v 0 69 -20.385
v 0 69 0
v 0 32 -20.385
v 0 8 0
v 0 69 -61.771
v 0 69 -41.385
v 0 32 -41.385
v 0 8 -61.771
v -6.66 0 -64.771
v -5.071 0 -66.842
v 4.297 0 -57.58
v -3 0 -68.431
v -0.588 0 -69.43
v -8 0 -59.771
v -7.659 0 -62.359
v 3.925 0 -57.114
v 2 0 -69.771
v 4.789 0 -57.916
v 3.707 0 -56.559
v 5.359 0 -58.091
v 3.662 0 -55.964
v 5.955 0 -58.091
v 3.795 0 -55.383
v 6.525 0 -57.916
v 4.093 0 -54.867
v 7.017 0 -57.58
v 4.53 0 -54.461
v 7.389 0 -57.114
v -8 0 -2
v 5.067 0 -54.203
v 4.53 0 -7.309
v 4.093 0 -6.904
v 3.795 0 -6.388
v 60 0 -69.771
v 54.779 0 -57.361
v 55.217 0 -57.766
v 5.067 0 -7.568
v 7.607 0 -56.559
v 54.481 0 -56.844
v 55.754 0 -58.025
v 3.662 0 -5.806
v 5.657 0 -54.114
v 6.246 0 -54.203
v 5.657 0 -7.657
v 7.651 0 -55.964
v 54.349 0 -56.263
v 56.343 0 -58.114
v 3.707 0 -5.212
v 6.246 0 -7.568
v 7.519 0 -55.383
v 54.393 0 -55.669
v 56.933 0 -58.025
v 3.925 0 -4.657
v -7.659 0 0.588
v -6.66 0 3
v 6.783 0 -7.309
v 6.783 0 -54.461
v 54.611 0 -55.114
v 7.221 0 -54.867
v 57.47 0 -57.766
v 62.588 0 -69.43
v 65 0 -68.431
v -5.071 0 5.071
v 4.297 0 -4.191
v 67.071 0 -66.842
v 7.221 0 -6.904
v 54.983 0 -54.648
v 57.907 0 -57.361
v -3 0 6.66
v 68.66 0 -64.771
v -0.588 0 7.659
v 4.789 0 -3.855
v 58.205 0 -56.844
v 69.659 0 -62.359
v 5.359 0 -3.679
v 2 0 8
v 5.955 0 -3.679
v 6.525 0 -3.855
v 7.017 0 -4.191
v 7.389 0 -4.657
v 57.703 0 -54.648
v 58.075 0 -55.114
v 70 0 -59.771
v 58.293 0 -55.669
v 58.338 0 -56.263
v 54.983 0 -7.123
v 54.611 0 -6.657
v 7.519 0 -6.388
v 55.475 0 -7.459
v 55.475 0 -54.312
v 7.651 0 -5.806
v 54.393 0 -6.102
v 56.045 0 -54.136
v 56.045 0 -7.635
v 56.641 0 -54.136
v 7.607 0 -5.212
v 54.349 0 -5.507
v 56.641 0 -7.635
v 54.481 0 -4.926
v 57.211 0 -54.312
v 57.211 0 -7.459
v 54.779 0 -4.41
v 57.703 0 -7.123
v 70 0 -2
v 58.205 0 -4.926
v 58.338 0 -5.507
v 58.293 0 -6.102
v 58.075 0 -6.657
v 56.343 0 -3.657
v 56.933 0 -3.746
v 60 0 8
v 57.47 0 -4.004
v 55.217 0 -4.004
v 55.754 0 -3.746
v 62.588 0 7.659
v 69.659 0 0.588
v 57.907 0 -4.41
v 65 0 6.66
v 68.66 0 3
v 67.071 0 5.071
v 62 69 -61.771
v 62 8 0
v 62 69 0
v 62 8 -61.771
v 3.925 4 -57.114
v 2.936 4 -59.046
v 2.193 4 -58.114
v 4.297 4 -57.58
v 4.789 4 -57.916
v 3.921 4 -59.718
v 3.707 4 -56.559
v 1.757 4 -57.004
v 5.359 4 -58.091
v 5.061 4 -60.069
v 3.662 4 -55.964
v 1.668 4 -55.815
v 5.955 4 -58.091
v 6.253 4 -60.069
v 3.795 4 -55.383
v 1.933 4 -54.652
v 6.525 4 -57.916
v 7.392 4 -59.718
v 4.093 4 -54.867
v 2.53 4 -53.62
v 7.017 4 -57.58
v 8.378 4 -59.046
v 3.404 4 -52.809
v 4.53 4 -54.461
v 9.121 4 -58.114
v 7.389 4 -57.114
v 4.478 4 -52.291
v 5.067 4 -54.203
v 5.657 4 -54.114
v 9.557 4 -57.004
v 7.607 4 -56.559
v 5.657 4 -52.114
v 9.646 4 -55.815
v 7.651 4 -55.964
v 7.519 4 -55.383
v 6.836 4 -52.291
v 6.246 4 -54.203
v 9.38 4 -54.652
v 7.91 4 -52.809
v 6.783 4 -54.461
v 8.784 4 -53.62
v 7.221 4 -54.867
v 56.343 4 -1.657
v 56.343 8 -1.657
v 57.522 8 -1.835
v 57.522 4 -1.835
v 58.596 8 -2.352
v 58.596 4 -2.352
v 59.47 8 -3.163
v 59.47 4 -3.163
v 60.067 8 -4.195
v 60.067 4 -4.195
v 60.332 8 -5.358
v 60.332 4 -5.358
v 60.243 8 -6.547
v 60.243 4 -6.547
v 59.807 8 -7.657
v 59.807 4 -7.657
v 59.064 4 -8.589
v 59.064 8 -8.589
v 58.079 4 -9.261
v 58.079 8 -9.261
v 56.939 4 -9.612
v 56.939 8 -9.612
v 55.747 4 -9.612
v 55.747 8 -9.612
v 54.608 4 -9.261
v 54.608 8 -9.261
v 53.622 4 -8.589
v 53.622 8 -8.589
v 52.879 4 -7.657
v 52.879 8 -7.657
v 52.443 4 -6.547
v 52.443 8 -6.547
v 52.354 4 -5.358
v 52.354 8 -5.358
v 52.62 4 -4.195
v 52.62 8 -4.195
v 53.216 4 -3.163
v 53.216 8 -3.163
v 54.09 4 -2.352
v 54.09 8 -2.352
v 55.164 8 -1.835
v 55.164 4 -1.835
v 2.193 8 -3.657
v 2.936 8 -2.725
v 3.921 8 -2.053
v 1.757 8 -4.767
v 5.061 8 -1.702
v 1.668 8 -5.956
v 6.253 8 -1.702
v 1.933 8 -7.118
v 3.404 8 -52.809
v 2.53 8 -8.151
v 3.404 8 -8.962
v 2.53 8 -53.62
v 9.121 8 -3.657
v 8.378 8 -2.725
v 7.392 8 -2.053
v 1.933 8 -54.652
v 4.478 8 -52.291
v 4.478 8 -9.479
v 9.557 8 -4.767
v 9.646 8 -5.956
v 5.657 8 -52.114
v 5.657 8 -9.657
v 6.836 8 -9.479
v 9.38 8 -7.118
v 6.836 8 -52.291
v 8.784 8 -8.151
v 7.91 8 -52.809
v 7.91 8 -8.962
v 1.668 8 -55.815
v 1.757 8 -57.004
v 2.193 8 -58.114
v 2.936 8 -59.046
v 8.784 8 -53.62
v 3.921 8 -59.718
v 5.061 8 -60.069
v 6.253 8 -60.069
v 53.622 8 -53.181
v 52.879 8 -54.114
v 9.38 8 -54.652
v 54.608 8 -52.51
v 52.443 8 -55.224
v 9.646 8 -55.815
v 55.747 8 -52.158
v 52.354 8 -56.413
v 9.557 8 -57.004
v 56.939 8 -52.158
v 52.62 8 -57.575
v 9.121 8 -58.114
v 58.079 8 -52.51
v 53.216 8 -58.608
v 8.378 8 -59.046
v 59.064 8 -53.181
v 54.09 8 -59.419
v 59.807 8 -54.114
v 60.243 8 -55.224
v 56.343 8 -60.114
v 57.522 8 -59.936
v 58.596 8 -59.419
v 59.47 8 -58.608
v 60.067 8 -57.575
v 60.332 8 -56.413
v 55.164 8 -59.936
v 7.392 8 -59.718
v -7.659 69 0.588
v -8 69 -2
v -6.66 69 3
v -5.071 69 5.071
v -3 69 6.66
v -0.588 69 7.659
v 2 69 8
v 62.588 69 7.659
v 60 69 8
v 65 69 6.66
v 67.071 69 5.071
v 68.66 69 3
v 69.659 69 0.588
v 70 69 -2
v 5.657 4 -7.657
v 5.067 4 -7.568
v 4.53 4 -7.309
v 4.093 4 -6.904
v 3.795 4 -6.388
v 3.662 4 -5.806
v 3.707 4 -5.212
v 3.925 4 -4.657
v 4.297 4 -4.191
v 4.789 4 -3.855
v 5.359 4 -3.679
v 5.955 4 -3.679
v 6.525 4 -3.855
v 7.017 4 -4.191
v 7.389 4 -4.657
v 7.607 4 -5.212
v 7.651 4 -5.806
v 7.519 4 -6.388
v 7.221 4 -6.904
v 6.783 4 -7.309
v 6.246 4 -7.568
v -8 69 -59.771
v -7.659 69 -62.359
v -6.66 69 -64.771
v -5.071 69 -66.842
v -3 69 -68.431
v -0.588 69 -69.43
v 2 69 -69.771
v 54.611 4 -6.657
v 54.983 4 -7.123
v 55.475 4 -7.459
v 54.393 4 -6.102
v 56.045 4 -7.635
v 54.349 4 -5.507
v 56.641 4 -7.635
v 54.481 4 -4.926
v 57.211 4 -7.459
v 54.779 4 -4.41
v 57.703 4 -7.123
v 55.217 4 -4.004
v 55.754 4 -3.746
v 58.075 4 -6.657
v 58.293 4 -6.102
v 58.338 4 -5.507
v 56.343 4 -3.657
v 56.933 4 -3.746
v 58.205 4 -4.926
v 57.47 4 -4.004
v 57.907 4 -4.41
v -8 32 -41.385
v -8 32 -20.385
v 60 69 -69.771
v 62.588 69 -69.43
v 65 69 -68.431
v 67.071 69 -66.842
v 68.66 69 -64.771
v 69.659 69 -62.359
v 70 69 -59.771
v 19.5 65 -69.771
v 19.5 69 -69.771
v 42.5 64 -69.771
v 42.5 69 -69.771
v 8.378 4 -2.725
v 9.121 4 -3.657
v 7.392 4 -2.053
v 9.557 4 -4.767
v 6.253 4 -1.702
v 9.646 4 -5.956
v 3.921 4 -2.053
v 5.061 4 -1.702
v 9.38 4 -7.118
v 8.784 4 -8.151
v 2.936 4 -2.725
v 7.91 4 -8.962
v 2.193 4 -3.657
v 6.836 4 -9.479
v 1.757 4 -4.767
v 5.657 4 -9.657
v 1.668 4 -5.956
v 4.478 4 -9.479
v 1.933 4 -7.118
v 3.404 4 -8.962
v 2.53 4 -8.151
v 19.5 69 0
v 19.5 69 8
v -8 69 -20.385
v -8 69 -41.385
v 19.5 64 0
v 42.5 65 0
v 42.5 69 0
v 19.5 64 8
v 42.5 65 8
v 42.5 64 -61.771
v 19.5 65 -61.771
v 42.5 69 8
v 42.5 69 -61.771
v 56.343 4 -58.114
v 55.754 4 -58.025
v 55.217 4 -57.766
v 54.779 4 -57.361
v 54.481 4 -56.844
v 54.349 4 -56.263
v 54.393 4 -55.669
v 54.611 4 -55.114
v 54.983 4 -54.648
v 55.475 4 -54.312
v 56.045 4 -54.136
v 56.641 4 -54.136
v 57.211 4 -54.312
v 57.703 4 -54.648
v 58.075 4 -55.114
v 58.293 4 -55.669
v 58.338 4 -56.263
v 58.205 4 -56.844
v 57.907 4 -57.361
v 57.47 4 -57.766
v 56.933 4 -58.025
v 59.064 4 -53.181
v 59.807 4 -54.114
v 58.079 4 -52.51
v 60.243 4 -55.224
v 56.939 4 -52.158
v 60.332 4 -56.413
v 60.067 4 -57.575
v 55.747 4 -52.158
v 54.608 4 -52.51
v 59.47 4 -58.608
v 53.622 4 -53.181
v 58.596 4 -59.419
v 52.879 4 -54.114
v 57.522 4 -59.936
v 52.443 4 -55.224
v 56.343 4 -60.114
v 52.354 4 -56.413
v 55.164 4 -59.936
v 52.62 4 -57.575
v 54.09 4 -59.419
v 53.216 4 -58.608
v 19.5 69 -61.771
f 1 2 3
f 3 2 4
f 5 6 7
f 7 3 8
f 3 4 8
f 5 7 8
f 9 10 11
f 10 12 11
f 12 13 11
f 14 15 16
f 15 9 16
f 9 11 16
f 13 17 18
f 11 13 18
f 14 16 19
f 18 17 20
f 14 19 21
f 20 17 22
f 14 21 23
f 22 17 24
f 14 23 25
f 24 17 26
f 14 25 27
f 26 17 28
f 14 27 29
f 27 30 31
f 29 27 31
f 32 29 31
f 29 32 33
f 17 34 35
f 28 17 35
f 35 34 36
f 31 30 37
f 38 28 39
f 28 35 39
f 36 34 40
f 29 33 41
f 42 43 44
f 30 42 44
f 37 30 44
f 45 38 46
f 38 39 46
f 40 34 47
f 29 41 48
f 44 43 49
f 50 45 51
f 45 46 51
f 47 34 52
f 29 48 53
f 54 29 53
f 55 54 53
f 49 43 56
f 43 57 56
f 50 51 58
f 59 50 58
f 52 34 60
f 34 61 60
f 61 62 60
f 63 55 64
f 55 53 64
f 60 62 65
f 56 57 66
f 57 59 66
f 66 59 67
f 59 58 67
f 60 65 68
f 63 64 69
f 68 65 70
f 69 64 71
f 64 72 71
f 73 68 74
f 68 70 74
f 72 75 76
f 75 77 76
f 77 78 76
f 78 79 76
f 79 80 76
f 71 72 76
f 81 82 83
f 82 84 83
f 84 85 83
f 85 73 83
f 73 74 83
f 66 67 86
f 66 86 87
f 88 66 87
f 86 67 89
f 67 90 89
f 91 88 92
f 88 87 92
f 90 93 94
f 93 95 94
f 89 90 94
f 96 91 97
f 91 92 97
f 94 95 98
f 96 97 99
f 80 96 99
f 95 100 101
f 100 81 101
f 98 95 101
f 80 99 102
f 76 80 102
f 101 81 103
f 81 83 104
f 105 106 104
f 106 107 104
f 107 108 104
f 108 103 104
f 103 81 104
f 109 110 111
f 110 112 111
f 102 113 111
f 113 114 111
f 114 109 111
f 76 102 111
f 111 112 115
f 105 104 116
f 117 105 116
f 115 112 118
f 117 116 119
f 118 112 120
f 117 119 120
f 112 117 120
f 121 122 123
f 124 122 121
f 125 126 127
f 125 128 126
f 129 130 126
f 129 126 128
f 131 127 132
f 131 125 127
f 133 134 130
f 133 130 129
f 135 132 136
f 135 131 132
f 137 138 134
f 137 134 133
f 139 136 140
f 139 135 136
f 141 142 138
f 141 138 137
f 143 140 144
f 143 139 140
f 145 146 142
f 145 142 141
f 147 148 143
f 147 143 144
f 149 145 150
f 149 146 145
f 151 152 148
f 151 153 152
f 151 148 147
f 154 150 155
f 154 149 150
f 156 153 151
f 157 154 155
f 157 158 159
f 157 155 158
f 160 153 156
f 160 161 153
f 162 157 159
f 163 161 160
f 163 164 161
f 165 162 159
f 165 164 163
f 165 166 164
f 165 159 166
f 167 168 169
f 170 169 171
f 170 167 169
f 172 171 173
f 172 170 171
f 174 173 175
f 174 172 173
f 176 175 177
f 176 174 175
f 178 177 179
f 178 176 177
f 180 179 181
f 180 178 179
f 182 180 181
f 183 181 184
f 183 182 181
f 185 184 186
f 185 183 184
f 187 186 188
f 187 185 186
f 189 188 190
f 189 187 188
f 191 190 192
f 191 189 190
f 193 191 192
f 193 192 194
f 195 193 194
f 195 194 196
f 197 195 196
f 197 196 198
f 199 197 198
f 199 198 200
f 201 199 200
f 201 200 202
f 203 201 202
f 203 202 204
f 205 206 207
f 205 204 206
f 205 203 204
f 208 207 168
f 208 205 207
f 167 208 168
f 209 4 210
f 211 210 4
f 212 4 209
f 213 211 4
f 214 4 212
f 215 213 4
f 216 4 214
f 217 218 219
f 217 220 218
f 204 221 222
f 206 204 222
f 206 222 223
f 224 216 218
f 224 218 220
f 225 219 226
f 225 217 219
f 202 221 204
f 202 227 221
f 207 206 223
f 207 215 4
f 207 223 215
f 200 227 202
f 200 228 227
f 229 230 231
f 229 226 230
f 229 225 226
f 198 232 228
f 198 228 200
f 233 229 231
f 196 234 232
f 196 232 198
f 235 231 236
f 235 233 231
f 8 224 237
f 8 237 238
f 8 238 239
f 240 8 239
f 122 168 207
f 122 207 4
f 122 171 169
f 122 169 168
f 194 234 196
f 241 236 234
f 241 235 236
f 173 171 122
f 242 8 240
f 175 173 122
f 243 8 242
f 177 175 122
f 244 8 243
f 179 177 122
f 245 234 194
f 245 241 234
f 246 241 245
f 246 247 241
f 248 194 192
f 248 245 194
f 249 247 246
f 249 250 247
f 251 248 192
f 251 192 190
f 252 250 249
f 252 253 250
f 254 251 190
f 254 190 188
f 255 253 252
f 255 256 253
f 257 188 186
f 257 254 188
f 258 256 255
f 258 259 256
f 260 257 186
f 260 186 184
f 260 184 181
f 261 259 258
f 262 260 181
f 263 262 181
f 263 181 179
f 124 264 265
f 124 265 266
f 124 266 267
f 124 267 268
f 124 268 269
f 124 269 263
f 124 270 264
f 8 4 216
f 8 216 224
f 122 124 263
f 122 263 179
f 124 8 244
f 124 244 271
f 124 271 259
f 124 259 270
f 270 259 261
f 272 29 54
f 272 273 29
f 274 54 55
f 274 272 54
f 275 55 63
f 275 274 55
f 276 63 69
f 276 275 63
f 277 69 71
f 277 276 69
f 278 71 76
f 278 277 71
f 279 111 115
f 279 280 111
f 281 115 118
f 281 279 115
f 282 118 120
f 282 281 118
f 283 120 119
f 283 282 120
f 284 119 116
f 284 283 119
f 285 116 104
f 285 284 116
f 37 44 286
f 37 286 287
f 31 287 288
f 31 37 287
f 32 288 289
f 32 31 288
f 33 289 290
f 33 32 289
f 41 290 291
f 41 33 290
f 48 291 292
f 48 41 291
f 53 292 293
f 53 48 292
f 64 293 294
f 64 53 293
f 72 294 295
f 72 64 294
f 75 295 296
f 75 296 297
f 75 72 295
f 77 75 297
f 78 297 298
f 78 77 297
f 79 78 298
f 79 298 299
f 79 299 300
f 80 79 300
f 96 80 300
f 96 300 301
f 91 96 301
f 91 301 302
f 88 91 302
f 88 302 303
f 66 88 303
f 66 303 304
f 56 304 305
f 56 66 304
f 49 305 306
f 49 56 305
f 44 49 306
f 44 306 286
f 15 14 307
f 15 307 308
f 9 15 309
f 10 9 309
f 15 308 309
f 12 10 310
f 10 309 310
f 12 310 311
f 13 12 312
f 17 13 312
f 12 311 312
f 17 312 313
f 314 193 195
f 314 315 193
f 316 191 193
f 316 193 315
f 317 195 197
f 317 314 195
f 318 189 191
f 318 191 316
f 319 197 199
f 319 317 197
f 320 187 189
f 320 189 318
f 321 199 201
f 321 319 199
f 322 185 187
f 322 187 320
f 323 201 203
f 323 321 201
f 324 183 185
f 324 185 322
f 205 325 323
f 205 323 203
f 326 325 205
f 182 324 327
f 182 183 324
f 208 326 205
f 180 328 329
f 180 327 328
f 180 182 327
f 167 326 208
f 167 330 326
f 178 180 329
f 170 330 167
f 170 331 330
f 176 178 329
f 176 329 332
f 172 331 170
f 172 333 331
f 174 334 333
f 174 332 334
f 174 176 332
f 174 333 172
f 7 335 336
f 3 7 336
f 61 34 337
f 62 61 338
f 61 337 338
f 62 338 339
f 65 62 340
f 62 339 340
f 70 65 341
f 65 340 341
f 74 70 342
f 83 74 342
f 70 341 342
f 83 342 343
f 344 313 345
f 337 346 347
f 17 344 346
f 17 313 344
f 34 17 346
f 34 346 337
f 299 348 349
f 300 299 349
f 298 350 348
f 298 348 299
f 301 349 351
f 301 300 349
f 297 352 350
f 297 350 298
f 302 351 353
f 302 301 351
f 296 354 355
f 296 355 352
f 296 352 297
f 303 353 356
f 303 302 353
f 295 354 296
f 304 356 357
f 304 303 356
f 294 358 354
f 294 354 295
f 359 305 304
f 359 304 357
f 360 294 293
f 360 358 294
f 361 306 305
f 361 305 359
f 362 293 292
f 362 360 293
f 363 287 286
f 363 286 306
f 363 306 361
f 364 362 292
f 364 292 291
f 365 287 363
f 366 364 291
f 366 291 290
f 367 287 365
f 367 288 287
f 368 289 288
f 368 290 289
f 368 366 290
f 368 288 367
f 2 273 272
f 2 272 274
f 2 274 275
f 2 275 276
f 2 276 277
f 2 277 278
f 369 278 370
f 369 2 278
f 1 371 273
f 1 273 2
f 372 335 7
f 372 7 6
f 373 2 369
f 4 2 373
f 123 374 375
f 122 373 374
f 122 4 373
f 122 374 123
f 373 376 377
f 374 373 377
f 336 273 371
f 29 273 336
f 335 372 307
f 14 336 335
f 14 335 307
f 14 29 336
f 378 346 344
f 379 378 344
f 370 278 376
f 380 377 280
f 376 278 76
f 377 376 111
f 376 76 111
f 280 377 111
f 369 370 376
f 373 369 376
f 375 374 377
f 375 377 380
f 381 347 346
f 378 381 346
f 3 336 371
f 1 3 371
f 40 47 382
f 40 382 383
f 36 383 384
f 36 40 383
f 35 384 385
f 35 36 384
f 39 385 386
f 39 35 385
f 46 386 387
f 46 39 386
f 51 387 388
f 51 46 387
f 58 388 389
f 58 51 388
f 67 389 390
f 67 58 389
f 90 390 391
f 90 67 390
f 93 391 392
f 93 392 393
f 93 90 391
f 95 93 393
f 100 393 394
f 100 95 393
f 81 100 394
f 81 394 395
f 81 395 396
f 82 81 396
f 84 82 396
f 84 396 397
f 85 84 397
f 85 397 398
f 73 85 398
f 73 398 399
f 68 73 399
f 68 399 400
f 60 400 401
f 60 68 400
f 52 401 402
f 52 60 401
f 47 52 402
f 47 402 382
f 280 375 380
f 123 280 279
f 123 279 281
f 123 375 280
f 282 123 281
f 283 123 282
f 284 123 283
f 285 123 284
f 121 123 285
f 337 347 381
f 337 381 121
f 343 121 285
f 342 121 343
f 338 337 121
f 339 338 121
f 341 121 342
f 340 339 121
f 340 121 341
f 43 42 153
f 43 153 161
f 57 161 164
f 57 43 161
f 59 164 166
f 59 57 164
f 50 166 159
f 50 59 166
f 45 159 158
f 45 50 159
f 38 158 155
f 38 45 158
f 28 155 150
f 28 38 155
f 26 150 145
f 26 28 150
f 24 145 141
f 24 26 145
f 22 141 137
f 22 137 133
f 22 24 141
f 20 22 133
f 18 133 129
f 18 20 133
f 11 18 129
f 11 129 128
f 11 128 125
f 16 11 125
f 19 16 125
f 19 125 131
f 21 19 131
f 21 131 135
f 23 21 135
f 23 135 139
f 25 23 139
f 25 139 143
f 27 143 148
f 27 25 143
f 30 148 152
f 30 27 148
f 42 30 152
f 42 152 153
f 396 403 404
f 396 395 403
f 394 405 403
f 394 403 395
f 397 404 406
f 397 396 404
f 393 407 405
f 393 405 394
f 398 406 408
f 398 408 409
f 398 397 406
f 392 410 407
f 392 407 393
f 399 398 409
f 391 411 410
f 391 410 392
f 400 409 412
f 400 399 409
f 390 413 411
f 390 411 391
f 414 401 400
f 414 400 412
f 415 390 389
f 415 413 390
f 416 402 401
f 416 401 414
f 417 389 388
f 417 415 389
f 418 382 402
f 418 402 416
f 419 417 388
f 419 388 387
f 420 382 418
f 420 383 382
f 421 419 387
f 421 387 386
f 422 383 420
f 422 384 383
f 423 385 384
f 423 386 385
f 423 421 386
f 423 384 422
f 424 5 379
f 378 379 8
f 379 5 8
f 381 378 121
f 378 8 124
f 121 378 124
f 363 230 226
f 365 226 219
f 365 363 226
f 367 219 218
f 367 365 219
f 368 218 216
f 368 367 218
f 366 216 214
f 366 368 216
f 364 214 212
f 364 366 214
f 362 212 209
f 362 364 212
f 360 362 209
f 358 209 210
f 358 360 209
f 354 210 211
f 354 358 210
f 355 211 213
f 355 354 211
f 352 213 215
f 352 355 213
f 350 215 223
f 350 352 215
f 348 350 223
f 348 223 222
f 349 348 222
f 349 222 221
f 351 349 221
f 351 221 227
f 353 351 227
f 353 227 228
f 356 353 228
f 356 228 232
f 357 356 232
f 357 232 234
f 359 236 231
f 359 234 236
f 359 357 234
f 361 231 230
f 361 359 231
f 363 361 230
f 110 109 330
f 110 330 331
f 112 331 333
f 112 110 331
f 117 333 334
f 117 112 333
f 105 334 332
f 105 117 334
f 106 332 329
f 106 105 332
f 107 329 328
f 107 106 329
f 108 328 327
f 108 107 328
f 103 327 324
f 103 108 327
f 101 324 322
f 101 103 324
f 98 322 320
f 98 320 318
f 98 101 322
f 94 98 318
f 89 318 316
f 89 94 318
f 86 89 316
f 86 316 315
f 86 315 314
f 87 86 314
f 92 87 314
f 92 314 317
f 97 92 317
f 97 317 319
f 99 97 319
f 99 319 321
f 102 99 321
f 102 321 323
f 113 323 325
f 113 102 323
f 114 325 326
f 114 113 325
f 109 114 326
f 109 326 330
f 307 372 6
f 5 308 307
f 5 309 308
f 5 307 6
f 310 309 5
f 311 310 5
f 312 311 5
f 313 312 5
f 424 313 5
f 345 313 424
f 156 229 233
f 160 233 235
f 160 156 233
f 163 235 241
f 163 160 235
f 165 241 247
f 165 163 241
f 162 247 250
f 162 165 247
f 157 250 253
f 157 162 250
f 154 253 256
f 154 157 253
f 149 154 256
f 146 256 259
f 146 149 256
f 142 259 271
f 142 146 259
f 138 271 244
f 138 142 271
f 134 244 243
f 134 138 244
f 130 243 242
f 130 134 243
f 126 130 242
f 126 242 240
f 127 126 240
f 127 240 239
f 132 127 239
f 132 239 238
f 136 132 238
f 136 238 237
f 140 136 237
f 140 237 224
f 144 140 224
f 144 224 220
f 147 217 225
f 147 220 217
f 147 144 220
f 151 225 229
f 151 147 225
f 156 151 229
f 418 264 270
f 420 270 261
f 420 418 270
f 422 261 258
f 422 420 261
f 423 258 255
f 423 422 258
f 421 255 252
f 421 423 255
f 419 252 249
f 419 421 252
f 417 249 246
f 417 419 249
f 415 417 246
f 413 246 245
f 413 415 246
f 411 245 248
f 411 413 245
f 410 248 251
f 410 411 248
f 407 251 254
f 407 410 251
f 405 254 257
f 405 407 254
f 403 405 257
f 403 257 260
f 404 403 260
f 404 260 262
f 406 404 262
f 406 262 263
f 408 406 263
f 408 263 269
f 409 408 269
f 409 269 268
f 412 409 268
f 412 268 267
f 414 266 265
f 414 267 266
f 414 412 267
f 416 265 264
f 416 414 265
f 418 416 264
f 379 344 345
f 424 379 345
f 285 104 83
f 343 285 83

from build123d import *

# Parameters (mm, degrees)
SKETCH1_W            = 62
SKETCH1_H            = 61.770504471
BOSS_EXTRUDE6_DEPTH  = 8
SKETCH1_15_W         = 78
SKETCH1_15_H         = 77.770504471
SKETCH1_15_W_2       = 62
SKETCH1_15_H_2       = 61.770504471
BOSS_EXTRUDE9_DEPTH  = 69
SKETCH1_17_R         = 4
CUT_EXTRUDE2_DEPTH   = 56
SKETCH1_18_R         = 4
SKETCH1_18_R_2       = 2
BOSS_EXTRUDE10_DEPTH = 4
FILLET3_R            = 10
CUT_EXTRUDE10_DEPTH  = 8
CUT_EXTRUDE11_DEPTH  = 8
SKETCH6_W            = 21
SKETCH6_H            = 37
CUT_EXTRUDE13_DEPTH  = 10


with BuildPart() as part:
    # Sketch1 → Boss-Extrude6 (new body)
    with BuildSketch(Plane(origin=(0, 0, 0), x_dir=(1, 0, 0), z_dir=(0, 1, 0))):
        with Locations((31, 30.885252236)):
            Rectangle(SKETCH1_W, SKETCH1_H)
    extrude(amount=BOSS_EXTRUDE6_DEPTH)

    # Sketch1<15> → Boss-Extrude9 (add)
    with BuildSketch(Plane(origin=(0, 0, 0), x_dir=(1, 0, 0), z_dir=(0, 1, 0))):
        with Locations((31, 30.885252236)):
            Rectangle(SKETCH1_15_W, SKETCH1_15_H)
        with Locations((31, 30.885252236)):
            Rectangle(SKETCH1_15_W_2, SKETCH1_15_H_2, mode=Mode.SUBTRACT)
    extrude(amount=BOSS_EXTRUDE9_DEPTH)

    # Sketch1<17> → Cut-Extrude2 (cut)
    with BuildSketch(Plane(origin=(0, 0, 0), x_dir=(1, 0, 0), z_dir=(0, 1, 0))):
        with Locations((5.656854249, 56.113650222)):
            Circle(SKETCH1_17_R)
        with Locations((56.343145751, 56.113650222)):
            Circle(SKETCH1_17_R)
        with Locations((56.343145751, 5.656854249)):
            Circle(SKETCH1_17_R)
        with Locations((5.656854249, 5.656854249)):
            Circle(SKETCH1_17_R)
    extrude(amount=CUT_EXTRUDE2_DEPTH, mode=Mode.SUBTRACT)

    # Sketch1<18> → Boss-Extrude10 (add)
    # profile 1 of 4: a face of its own
    with BuildSketch(Plane(origin=(0, 0, 0), x_dir=(1, 0, 0), z_dir=(0, 1, 0))):
        with Locations((5.656854249, 56.113650222)):
            Circle(SKETCH1_18_R)
        with Locations((5.656854249, 56.113650222)):
            Circle(SKETCH1_18_R_2, mode=Mode.SUBTRACT)
    # profile 2 of 4: a face of its own
    with BuildSketch(Plane(origin=(0, 0, 0), x_dir=(1, 0, 0), z_dir=(0, 1, 0))):
        with Locations((56.343145751, 56.113650222)):
            Circle(SKETCH1_18_R)
        with Locations((56.343145751, 56.113650222)):
            Circle(SKETCH1_18_R_2, mode=Mode.SUBTRACT)
    # profile 3 of 4: a face of its own
    with BuildSketch(Plane(origin=(0, 0, 0), x_dir=(1, 0, 0), z_dir=(0, 1, 0))):
        with Locations((56.343145751, 5.656854249)):
            Circle(SKETCH1_18_R)
        with Locations((56.343145751, 5.656854249)):
            Circle(SKETCH1_18_R_2, mode=Mode.SUBTRACT)
    # profile 4 of 4: a face of its own
    with BuildSketch(Plane(origin=(0, 0, 0), x_dir=(1, 0, 0), z_dir=(0, 1, 0))):
        with Locations((5.656854249, 5.656854249)):
            Circle(SKETCH1_18_R)
        with Locations((5.656854249, 5.656854249)):
            Circle(SKETCH1_18_R_2, mode=Mode.SUBTRACT)
    extrude(amount=BOSS_EXTRUDE10_DEPTH)

    # Fillet3
    fillet3_edges = [part.edges().sort_by_distance(p)[0] for p in [
        (70, 34.5, -69.770504471),
        (-8, 34.5, -69.770504471),
        (-8, 34.5, 8),
        (70, 34.5, 8),
    ]]
    fillet(fillet3_edges, radius=FILLET3_R)

    # Sketch3 → Cut-Extrude10 (cut)
    with BuildSketch(Plane(origin=(0, 0, -69.770504471), x_dir=(-1, 0, 0), z_dir=(0, 0, -1))):
        Polygon((-42.5, 69), (-42.5, 64), (-19.5, 65), (-19.5, 69), align=None)
    extrude(amount=-CUT_EXTRUDE10_DEPTH, mode=Mode.SUBTRACT)

    # Sketch9 → Cut-Extrude11 (cut)
    with BuildSketch(Plane.XY.offset(8)):
        Polygon((19.5, 69), (19.5, 64), (42.5, 65), (42.5, 69), align=None)
    extrude(amount=-CUT_EXTRUDE11_DEPTH, mode=Mode.SUBTRACT)

    # Sketch6 → Cut-Extrude13 (cut)
    with BuildSketch(Plane.ZY.offset(8)):
        with Locations((-30.885252236, 50.5)):
            Rectangle(SKETCH6_W, SKETCH6_H)
    extrude(amount=-CUT_EXTRUDE13_DEPTH, mode=Mode.SUBTRACT)


solid = part.part
